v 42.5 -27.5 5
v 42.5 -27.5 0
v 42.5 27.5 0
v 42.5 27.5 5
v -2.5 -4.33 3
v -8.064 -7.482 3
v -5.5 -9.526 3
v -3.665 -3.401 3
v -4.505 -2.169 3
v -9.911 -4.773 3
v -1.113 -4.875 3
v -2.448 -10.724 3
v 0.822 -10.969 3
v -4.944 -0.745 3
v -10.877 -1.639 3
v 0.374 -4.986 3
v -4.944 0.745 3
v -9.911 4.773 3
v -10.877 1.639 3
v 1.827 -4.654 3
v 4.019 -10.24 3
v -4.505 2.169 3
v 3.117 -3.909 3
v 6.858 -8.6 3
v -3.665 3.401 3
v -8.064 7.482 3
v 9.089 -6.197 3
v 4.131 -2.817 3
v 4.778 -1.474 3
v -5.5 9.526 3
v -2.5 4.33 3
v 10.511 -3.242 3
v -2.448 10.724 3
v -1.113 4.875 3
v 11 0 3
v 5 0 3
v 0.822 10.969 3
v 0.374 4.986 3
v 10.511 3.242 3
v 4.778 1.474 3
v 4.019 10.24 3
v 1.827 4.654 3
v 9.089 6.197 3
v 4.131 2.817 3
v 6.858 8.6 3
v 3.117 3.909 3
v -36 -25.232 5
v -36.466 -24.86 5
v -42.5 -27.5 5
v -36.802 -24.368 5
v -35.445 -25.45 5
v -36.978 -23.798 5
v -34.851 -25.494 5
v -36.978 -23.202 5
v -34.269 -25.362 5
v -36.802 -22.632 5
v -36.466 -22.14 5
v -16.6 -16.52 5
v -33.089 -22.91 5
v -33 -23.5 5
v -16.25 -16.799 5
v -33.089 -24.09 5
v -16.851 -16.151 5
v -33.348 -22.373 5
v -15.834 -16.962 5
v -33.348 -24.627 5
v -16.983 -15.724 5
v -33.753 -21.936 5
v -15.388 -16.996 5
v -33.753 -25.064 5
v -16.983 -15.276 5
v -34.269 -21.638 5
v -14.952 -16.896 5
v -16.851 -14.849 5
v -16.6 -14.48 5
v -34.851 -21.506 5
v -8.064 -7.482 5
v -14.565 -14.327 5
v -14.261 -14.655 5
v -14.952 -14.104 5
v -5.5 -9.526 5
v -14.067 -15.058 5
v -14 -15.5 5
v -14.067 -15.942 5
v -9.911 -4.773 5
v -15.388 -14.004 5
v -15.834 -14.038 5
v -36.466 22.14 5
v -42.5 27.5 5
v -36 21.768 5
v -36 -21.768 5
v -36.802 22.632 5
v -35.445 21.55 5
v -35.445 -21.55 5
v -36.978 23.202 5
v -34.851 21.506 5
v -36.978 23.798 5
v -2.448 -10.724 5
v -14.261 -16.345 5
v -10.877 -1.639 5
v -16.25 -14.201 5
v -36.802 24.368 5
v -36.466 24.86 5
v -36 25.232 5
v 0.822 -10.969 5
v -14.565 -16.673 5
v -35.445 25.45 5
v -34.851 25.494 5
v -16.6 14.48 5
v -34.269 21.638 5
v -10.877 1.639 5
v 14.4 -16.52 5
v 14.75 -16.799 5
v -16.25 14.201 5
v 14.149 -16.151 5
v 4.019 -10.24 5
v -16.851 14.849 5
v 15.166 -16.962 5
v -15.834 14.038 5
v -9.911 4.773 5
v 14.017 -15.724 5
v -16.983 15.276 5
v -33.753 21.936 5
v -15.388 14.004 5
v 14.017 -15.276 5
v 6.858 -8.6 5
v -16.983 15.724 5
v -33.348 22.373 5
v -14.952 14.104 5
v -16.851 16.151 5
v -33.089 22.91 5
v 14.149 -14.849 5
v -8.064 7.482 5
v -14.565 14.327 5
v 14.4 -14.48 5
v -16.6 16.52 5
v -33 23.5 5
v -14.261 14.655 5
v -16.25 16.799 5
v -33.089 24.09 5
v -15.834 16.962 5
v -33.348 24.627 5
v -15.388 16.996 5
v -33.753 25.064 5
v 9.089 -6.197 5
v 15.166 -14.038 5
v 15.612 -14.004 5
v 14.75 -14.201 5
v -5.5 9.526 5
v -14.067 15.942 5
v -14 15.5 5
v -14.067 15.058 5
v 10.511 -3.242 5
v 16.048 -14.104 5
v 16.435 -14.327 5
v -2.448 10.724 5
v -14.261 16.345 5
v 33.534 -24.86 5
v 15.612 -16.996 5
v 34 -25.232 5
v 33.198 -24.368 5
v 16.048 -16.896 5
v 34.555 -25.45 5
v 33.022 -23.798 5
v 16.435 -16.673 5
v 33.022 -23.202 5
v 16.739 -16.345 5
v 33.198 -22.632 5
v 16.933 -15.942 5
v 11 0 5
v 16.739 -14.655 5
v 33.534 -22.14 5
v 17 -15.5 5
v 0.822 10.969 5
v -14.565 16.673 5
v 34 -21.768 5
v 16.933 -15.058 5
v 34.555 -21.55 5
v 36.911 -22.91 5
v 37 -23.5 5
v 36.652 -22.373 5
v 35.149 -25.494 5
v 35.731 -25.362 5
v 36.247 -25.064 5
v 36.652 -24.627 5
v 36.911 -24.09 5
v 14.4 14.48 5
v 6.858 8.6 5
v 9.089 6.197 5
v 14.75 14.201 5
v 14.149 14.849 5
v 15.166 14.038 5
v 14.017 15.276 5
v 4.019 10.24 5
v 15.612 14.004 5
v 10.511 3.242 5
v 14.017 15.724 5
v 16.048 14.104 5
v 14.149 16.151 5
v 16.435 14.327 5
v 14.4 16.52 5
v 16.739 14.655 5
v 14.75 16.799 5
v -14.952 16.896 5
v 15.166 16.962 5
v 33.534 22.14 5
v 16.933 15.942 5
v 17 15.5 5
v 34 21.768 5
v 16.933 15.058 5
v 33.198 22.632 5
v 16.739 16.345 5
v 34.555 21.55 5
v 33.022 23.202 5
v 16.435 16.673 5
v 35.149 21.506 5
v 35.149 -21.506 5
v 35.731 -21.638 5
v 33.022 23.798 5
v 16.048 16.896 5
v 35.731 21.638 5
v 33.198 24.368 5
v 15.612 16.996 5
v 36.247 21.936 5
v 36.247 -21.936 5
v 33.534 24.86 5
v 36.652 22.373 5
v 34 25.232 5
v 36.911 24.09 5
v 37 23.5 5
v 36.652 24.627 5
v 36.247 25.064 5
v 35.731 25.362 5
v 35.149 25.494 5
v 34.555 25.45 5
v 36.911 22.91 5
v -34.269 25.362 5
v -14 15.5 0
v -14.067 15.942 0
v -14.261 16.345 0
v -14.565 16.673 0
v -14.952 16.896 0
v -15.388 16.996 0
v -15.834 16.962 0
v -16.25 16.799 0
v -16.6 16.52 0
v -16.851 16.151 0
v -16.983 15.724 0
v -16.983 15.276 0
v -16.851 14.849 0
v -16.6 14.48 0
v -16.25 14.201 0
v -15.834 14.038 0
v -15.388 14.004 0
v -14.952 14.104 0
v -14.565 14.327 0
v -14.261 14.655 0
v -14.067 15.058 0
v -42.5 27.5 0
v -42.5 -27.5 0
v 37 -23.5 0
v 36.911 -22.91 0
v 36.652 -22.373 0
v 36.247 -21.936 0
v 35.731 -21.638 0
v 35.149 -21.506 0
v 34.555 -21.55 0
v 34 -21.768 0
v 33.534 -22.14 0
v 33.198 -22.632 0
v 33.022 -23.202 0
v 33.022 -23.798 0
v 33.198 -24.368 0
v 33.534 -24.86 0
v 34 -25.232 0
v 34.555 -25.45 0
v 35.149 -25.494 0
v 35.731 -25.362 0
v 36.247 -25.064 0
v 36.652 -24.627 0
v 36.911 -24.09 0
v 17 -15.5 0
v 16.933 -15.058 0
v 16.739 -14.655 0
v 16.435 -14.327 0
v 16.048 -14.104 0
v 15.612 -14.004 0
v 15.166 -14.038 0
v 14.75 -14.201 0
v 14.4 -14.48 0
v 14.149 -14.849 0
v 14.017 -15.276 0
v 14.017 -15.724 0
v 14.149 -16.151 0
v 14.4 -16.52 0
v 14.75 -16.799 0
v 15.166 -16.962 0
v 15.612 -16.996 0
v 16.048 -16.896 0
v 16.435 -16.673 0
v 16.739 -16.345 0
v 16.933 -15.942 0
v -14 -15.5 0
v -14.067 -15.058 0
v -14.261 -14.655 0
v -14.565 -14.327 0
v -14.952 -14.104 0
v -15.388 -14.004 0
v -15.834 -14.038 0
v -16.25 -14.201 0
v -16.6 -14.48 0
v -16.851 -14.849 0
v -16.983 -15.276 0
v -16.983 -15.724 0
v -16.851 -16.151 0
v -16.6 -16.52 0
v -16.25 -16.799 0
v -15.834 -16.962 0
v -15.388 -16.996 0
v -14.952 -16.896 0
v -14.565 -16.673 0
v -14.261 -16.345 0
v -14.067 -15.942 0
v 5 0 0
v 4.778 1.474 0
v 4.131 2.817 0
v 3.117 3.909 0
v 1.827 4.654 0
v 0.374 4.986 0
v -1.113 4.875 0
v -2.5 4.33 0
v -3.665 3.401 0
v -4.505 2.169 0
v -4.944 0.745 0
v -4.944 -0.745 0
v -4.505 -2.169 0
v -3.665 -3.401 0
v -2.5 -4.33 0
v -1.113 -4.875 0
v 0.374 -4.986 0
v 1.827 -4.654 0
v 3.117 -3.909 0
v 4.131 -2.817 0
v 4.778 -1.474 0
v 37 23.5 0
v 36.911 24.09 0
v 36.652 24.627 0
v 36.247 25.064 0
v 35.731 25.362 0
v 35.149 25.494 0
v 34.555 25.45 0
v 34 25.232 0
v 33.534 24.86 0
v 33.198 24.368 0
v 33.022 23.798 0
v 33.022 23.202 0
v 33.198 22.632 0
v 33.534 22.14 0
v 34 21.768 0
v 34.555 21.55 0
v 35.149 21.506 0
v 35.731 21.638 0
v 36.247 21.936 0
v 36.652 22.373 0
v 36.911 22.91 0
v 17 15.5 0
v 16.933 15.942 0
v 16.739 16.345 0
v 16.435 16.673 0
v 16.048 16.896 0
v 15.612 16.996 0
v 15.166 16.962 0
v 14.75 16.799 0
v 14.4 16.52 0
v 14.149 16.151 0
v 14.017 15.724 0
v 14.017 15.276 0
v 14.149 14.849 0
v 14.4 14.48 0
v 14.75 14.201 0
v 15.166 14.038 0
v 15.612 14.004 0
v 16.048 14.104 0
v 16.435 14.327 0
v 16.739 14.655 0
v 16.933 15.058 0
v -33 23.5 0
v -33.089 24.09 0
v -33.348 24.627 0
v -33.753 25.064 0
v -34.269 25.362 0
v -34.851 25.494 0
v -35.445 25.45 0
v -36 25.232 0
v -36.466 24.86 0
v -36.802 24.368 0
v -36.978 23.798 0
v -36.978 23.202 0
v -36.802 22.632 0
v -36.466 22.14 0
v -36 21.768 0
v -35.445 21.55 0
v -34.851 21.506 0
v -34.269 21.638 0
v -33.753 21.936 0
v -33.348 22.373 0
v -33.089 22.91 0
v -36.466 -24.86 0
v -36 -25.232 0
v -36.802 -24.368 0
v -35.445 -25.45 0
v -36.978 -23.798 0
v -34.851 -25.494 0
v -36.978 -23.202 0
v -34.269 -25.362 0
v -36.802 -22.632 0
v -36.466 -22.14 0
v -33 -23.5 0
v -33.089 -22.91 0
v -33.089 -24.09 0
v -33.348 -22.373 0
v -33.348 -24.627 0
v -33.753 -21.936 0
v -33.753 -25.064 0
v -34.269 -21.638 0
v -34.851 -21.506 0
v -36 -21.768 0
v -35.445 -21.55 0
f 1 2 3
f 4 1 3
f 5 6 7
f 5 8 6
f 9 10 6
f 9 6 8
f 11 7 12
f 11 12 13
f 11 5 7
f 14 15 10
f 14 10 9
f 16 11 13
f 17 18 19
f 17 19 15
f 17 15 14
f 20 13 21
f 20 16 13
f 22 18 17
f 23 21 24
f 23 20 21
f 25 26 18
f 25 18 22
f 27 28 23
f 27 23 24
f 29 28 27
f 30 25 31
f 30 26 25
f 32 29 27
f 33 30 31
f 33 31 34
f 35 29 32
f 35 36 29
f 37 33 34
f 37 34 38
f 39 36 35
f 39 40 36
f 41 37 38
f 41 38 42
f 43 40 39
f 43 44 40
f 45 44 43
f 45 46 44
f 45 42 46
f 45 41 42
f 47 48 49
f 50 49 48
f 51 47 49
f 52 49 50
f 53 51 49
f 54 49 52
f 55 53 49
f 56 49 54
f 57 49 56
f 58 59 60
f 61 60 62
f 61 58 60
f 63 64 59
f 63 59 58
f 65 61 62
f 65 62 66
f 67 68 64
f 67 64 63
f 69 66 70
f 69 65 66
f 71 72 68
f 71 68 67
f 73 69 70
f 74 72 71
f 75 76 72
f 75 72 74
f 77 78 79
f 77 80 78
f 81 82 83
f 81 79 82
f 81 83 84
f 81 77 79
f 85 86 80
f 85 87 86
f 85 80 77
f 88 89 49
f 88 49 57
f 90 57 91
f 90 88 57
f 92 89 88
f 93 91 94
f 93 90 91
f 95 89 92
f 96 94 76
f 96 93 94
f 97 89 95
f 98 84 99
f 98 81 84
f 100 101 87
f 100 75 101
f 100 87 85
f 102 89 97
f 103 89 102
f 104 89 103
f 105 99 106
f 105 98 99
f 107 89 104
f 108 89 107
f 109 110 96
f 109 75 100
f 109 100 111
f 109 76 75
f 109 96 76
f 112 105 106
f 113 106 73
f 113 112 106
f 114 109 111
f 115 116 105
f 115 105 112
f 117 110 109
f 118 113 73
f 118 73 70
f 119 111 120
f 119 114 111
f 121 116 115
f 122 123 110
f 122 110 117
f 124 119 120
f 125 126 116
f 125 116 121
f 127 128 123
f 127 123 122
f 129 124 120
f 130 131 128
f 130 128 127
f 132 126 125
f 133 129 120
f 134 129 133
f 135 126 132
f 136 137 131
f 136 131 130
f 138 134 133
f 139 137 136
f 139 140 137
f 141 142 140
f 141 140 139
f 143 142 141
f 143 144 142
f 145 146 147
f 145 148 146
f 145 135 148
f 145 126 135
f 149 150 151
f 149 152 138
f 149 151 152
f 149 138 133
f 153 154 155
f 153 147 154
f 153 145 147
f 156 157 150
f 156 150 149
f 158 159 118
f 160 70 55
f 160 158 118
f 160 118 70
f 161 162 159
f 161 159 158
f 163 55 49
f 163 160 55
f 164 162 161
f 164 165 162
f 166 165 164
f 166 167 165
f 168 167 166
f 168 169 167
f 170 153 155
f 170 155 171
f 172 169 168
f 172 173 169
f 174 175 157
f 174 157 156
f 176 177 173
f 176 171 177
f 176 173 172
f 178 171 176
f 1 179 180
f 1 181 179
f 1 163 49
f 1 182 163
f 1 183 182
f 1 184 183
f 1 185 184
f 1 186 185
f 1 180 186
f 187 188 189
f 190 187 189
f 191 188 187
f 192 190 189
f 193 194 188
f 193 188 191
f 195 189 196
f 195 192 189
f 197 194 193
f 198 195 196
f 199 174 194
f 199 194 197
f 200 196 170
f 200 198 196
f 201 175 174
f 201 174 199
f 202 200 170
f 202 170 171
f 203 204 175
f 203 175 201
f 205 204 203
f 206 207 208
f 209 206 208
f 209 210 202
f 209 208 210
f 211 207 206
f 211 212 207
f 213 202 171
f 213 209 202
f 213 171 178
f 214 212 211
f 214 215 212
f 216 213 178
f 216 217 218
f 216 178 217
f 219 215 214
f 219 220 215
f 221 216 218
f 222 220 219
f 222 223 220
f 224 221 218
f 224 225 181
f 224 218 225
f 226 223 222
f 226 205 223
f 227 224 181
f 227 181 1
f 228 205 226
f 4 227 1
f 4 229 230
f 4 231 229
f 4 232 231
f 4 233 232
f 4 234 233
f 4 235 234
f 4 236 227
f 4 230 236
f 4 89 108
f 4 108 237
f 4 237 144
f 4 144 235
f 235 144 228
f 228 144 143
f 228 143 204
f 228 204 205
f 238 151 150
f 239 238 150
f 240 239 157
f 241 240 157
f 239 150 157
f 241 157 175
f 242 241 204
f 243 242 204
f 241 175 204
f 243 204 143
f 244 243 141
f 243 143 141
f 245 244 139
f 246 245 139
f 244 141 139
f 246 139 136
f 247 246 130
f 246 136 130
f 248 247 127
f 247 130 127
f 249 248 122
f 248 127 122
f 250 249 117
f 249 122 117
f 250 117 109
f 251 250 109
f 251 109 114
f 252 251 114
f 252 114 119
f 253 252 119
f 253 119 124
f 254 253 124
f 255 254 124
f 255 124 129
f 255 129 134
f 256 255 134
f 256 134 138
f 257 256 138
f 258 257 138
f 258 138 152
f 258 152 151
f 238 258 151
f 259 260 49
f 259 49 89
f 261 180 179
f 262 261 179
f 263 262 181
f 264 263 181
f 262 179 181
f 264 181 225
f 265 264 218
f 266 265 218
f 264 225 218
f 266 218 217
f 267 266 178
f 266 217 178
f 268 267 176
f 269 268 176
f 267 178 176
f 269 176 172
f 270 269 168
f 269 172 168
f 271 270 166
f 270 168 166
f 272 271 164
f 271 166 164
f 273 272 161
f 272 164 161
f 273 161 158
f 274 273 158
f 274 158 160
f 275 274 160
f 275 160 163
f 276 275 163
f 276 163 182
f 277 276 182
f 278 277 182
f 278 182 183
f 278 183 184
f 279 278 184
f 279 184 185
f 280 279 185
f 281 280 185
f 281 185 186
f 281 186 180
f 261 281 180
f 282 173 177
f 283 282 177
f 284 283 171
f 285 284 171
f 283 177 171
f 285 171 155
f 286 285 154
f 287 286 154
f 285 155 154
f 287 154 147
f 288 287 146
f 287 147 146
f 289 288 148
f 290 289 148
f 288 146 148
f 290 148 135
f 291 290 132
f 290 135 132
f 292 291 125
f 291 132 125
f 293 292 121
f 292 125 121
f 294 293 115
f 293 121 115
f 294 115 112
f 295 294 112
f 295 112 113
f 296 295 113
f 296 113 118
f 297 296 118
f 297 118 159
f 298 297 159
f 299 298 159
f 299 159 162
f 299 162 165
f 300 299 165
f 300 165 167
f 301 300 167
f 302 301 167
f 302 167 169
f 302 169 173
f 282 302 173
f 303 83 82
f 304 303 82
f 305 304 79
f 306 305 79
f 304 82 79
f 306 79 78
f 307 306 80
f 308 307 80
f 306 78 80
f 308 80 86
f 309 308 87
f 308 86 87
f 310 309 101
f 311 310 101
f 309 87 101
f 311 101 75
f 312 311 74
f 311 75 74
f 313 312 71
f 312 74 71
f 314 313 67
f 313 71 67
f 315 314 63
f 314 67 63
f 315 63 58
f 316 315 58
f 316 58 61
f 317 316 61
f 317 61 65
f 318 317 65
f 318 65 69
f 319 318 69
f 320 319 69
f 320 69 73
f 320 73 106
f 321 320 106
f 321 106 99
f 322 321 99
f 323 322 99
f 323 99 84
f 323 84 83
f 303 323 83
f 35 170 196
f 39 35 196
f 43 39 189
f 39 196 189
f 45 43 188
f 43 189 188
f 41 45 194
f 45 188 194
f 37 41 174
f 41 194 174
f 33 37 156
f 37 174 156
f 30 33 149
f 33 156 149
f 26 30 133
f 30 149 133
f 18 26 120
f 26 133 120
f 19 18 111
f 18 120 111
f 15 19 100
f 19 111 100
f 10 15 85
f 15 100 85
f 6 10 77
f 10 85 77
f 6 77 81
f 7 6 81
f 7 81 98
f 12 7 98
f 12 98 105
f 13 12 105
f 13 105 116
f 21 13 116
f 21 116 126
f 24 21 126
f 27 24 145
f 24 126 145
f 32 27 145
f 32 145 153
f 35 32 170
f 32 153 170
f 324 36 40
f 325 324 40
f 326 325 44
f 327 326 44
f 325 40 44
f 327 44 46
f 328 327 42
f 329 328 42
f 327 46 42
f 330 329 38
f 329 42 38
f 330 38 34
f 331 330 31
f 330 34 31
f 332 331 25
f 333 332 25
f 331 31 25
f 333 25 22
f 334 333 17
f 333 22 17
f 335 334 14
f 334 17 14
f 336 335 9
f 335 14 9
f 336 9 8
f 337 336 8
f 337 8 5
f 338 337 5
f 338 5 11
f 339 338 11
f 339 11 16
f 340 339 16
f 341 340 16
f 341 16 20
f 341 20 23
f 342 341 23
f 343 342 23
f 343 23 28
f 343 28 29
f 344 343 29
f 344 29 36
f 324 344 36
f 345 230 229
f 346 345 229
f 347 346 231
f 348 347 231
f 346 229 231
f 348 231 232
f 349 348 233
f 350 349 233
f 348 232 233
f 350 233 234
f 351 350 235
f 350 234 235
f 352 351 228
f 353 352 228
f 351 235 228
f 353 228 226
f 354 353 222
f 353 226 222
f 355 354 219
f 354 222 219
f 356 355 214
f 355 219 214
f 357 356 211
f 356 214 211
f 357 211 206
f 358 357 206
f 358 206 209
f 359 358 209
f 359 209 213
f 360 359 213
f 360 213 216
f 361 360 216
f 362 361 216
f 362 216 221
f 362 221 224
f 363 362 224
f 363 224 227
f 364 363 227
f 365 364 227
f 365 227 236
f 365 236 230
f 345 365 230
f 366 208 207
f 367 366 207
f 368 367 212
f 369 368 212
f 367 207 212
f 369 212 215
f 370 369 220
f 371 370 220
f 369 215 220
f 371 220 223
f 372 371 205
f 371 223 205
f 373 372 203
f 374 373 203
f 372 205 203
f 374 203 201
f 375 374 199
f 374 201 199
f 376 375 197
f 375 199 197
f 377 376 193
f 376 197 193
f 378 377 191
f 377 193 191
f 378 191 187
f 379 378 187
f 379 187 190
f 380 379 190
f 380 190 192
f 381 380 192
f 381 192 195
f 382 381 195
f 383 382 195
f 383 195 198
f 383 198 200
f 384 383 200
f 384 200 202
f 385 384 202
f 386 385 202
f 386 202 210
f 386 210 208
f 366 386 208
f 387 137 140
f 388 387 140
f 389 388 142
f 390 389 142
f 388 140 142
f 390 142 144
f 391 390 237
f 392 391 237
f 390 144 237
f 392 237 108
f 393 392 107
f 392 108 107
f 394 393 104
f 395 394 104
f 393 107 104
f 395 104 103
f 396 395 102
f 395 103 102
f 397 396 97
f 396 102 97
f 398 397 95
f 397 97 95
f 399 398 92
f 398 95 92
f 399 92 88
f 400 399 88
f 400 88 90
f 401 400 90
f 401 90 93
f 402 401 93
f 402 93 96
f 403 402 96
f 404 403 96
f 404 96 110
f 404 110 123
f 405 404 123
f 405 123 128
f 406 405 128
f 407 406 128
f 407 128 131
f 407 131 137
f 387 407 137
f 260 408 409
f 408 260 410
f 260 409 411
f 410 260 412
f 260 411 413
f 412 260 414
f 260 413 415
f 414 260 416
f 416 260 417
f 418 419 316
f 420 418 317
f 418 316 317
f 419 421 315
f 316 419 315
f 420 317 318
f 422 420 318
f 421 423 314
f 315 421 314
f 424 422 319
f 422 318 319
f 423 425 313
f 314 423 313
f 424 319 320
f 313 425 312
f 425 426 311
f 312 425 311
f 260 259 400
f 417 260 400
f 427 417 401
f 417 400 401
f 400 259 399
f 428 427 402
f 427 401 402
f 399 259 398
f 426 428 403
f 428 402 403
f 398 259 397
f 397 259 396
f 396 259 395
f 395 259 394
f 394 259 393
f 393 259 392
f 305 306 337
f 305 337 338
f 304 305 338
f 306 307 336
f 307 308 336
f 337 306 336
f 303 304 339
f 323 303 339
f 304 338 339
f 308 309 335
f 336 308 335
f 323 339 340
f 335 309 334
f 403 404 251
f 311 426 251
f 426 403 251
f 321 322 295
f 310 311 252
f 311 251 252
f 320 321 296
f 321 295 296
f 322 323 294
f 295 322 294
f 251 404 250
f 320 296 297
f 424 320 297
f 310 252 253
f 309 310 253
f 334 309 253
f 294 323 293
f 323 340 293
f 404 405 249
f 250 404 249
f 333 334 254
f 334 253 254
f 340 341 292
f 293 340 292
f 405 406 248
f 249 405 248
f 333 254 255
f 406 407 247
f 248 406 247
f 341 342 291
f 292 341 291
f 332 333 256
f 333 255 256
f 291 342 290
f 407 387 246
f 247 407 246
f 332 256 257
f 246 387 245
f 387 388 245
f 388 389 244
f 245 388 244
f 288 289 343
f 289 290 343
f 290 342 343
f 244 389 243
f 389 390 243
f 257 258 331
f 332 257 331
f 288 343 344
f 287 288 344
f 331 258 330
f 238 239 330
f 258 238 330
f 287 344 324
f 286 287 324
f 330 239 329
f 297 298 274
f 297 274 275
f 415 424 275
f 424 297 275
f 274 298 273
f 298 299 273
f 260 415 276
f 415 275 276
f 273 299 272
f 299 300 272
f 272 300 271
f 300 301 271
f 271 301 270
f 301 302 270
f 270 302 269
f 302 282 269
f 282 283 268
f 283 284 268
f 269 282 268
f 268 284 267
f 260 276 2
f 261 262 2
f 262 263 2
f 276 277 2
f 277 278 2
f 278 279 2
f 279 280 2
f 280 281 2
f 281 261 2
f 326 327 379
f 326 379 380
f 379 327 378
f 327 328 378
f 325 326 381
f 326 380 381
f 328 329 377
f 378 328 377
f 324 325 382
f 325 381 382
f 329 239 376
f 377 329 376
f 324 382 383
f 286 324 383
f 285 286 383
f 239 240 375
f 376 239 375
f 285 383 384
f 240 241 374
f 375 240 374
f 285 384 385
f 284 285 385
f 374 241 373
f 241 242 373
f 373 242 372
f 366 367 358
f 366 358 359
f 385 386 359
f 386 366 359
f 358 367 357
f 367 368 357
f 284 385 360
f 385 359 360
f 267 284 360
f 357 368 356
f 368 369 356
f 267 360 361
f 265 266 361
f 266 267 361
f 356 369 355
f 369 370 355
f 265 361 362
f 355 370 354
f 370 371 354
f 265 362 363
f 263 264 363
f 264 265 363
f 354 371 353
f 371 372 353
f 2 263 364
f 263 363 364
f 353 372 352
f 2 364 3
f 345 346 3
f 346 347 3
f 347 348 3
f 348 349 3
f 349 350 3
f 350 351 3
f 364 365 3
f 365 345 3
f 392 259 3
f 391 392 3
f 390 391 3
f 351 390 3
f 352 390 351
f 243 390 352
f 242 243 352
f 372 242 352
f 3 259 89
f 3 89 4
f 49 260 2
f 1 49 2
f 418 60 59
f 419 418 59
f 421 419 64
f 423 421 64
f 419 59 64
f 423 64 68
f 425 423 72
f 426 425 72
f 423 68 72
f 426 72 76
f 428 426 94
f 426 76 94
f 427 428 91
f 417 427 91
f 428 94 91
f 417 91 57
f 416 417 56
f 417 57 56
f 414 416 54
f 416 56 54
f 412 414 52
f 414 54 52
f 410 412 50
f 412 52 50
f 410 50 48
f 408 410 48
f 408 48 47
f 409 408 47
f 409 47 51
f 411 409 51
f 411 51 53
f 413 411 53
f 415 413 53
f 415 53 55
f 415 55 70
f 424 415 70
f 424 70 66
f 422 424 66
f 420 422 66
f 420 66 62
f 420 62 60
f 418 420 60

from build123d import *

# Parameters (mm, degrees)
F0_W     = 85
F0_H     = 55
F1_DEPTH = 5
F2_R     = 11
F3_DEPTH = 2
F4_R     = 5
F5_DEPTH = 3.001
F6_R     = 1.5
F7_DEPTH = 5.001
F8_R     = 2
F9_DEPTH = 5.001


with BuildPart() as f1:
    # F0 (on Top) → F1 (new body)
    with BuildSketch(Plane.XY):
        Rectangle(F0_W, F0_H)
    extrude(amount=F1_DEPTH)

    # F2 (on face) → F3 (cut)
    with BuildSketch(Plane.XY.offset(5)):
        Circle(F2_R)
    extrude(amount=-F3_DEPTH, mode=Mode.SUBTRACT)

    # F4 (on face) → F5 (cut, through all)
    with BuildSketch(Plane.XY.offset(3)):
        Circle(F4_R)
    extrude(amount=-F5_DEPTH, mode=Mode.SUBTRACT)

    # F6 (on face) → F7 (cut, through all)
    with BuildSketch(Plane.XY.offset(5)):
        with Locations((-15.5, 15.5)):
            Circle(F6_R)
        with Locations((15.5, 15.5)):
            Circle(F6_R)
        with Locations((15.5, -15.5)):
            Circle(F6_R)
        with Locations((-15.5, -15.5)):
            Circle(F6_R)
    extrude(amount=-F7_DEPTH, mode=Mode.SUBTRACT)

    # F8 (on face) → F9 (cut, through all)
    with BuildSketch(Plane.XY.offset(5)):
        with Locations((-35, -23.5)):
            Circle(F8_R)
        with Locations((-35, 23.5)):
            Circle(F8_R)
        with Locations((35, 23.5)):
            Circle(F8_R)
        with Locations((35, -23.5)):
            Circle(F8_R)
    extrude(amount=-F9_DEPTH, mode=Mode.SUBTRACT)


solid = f1.part
